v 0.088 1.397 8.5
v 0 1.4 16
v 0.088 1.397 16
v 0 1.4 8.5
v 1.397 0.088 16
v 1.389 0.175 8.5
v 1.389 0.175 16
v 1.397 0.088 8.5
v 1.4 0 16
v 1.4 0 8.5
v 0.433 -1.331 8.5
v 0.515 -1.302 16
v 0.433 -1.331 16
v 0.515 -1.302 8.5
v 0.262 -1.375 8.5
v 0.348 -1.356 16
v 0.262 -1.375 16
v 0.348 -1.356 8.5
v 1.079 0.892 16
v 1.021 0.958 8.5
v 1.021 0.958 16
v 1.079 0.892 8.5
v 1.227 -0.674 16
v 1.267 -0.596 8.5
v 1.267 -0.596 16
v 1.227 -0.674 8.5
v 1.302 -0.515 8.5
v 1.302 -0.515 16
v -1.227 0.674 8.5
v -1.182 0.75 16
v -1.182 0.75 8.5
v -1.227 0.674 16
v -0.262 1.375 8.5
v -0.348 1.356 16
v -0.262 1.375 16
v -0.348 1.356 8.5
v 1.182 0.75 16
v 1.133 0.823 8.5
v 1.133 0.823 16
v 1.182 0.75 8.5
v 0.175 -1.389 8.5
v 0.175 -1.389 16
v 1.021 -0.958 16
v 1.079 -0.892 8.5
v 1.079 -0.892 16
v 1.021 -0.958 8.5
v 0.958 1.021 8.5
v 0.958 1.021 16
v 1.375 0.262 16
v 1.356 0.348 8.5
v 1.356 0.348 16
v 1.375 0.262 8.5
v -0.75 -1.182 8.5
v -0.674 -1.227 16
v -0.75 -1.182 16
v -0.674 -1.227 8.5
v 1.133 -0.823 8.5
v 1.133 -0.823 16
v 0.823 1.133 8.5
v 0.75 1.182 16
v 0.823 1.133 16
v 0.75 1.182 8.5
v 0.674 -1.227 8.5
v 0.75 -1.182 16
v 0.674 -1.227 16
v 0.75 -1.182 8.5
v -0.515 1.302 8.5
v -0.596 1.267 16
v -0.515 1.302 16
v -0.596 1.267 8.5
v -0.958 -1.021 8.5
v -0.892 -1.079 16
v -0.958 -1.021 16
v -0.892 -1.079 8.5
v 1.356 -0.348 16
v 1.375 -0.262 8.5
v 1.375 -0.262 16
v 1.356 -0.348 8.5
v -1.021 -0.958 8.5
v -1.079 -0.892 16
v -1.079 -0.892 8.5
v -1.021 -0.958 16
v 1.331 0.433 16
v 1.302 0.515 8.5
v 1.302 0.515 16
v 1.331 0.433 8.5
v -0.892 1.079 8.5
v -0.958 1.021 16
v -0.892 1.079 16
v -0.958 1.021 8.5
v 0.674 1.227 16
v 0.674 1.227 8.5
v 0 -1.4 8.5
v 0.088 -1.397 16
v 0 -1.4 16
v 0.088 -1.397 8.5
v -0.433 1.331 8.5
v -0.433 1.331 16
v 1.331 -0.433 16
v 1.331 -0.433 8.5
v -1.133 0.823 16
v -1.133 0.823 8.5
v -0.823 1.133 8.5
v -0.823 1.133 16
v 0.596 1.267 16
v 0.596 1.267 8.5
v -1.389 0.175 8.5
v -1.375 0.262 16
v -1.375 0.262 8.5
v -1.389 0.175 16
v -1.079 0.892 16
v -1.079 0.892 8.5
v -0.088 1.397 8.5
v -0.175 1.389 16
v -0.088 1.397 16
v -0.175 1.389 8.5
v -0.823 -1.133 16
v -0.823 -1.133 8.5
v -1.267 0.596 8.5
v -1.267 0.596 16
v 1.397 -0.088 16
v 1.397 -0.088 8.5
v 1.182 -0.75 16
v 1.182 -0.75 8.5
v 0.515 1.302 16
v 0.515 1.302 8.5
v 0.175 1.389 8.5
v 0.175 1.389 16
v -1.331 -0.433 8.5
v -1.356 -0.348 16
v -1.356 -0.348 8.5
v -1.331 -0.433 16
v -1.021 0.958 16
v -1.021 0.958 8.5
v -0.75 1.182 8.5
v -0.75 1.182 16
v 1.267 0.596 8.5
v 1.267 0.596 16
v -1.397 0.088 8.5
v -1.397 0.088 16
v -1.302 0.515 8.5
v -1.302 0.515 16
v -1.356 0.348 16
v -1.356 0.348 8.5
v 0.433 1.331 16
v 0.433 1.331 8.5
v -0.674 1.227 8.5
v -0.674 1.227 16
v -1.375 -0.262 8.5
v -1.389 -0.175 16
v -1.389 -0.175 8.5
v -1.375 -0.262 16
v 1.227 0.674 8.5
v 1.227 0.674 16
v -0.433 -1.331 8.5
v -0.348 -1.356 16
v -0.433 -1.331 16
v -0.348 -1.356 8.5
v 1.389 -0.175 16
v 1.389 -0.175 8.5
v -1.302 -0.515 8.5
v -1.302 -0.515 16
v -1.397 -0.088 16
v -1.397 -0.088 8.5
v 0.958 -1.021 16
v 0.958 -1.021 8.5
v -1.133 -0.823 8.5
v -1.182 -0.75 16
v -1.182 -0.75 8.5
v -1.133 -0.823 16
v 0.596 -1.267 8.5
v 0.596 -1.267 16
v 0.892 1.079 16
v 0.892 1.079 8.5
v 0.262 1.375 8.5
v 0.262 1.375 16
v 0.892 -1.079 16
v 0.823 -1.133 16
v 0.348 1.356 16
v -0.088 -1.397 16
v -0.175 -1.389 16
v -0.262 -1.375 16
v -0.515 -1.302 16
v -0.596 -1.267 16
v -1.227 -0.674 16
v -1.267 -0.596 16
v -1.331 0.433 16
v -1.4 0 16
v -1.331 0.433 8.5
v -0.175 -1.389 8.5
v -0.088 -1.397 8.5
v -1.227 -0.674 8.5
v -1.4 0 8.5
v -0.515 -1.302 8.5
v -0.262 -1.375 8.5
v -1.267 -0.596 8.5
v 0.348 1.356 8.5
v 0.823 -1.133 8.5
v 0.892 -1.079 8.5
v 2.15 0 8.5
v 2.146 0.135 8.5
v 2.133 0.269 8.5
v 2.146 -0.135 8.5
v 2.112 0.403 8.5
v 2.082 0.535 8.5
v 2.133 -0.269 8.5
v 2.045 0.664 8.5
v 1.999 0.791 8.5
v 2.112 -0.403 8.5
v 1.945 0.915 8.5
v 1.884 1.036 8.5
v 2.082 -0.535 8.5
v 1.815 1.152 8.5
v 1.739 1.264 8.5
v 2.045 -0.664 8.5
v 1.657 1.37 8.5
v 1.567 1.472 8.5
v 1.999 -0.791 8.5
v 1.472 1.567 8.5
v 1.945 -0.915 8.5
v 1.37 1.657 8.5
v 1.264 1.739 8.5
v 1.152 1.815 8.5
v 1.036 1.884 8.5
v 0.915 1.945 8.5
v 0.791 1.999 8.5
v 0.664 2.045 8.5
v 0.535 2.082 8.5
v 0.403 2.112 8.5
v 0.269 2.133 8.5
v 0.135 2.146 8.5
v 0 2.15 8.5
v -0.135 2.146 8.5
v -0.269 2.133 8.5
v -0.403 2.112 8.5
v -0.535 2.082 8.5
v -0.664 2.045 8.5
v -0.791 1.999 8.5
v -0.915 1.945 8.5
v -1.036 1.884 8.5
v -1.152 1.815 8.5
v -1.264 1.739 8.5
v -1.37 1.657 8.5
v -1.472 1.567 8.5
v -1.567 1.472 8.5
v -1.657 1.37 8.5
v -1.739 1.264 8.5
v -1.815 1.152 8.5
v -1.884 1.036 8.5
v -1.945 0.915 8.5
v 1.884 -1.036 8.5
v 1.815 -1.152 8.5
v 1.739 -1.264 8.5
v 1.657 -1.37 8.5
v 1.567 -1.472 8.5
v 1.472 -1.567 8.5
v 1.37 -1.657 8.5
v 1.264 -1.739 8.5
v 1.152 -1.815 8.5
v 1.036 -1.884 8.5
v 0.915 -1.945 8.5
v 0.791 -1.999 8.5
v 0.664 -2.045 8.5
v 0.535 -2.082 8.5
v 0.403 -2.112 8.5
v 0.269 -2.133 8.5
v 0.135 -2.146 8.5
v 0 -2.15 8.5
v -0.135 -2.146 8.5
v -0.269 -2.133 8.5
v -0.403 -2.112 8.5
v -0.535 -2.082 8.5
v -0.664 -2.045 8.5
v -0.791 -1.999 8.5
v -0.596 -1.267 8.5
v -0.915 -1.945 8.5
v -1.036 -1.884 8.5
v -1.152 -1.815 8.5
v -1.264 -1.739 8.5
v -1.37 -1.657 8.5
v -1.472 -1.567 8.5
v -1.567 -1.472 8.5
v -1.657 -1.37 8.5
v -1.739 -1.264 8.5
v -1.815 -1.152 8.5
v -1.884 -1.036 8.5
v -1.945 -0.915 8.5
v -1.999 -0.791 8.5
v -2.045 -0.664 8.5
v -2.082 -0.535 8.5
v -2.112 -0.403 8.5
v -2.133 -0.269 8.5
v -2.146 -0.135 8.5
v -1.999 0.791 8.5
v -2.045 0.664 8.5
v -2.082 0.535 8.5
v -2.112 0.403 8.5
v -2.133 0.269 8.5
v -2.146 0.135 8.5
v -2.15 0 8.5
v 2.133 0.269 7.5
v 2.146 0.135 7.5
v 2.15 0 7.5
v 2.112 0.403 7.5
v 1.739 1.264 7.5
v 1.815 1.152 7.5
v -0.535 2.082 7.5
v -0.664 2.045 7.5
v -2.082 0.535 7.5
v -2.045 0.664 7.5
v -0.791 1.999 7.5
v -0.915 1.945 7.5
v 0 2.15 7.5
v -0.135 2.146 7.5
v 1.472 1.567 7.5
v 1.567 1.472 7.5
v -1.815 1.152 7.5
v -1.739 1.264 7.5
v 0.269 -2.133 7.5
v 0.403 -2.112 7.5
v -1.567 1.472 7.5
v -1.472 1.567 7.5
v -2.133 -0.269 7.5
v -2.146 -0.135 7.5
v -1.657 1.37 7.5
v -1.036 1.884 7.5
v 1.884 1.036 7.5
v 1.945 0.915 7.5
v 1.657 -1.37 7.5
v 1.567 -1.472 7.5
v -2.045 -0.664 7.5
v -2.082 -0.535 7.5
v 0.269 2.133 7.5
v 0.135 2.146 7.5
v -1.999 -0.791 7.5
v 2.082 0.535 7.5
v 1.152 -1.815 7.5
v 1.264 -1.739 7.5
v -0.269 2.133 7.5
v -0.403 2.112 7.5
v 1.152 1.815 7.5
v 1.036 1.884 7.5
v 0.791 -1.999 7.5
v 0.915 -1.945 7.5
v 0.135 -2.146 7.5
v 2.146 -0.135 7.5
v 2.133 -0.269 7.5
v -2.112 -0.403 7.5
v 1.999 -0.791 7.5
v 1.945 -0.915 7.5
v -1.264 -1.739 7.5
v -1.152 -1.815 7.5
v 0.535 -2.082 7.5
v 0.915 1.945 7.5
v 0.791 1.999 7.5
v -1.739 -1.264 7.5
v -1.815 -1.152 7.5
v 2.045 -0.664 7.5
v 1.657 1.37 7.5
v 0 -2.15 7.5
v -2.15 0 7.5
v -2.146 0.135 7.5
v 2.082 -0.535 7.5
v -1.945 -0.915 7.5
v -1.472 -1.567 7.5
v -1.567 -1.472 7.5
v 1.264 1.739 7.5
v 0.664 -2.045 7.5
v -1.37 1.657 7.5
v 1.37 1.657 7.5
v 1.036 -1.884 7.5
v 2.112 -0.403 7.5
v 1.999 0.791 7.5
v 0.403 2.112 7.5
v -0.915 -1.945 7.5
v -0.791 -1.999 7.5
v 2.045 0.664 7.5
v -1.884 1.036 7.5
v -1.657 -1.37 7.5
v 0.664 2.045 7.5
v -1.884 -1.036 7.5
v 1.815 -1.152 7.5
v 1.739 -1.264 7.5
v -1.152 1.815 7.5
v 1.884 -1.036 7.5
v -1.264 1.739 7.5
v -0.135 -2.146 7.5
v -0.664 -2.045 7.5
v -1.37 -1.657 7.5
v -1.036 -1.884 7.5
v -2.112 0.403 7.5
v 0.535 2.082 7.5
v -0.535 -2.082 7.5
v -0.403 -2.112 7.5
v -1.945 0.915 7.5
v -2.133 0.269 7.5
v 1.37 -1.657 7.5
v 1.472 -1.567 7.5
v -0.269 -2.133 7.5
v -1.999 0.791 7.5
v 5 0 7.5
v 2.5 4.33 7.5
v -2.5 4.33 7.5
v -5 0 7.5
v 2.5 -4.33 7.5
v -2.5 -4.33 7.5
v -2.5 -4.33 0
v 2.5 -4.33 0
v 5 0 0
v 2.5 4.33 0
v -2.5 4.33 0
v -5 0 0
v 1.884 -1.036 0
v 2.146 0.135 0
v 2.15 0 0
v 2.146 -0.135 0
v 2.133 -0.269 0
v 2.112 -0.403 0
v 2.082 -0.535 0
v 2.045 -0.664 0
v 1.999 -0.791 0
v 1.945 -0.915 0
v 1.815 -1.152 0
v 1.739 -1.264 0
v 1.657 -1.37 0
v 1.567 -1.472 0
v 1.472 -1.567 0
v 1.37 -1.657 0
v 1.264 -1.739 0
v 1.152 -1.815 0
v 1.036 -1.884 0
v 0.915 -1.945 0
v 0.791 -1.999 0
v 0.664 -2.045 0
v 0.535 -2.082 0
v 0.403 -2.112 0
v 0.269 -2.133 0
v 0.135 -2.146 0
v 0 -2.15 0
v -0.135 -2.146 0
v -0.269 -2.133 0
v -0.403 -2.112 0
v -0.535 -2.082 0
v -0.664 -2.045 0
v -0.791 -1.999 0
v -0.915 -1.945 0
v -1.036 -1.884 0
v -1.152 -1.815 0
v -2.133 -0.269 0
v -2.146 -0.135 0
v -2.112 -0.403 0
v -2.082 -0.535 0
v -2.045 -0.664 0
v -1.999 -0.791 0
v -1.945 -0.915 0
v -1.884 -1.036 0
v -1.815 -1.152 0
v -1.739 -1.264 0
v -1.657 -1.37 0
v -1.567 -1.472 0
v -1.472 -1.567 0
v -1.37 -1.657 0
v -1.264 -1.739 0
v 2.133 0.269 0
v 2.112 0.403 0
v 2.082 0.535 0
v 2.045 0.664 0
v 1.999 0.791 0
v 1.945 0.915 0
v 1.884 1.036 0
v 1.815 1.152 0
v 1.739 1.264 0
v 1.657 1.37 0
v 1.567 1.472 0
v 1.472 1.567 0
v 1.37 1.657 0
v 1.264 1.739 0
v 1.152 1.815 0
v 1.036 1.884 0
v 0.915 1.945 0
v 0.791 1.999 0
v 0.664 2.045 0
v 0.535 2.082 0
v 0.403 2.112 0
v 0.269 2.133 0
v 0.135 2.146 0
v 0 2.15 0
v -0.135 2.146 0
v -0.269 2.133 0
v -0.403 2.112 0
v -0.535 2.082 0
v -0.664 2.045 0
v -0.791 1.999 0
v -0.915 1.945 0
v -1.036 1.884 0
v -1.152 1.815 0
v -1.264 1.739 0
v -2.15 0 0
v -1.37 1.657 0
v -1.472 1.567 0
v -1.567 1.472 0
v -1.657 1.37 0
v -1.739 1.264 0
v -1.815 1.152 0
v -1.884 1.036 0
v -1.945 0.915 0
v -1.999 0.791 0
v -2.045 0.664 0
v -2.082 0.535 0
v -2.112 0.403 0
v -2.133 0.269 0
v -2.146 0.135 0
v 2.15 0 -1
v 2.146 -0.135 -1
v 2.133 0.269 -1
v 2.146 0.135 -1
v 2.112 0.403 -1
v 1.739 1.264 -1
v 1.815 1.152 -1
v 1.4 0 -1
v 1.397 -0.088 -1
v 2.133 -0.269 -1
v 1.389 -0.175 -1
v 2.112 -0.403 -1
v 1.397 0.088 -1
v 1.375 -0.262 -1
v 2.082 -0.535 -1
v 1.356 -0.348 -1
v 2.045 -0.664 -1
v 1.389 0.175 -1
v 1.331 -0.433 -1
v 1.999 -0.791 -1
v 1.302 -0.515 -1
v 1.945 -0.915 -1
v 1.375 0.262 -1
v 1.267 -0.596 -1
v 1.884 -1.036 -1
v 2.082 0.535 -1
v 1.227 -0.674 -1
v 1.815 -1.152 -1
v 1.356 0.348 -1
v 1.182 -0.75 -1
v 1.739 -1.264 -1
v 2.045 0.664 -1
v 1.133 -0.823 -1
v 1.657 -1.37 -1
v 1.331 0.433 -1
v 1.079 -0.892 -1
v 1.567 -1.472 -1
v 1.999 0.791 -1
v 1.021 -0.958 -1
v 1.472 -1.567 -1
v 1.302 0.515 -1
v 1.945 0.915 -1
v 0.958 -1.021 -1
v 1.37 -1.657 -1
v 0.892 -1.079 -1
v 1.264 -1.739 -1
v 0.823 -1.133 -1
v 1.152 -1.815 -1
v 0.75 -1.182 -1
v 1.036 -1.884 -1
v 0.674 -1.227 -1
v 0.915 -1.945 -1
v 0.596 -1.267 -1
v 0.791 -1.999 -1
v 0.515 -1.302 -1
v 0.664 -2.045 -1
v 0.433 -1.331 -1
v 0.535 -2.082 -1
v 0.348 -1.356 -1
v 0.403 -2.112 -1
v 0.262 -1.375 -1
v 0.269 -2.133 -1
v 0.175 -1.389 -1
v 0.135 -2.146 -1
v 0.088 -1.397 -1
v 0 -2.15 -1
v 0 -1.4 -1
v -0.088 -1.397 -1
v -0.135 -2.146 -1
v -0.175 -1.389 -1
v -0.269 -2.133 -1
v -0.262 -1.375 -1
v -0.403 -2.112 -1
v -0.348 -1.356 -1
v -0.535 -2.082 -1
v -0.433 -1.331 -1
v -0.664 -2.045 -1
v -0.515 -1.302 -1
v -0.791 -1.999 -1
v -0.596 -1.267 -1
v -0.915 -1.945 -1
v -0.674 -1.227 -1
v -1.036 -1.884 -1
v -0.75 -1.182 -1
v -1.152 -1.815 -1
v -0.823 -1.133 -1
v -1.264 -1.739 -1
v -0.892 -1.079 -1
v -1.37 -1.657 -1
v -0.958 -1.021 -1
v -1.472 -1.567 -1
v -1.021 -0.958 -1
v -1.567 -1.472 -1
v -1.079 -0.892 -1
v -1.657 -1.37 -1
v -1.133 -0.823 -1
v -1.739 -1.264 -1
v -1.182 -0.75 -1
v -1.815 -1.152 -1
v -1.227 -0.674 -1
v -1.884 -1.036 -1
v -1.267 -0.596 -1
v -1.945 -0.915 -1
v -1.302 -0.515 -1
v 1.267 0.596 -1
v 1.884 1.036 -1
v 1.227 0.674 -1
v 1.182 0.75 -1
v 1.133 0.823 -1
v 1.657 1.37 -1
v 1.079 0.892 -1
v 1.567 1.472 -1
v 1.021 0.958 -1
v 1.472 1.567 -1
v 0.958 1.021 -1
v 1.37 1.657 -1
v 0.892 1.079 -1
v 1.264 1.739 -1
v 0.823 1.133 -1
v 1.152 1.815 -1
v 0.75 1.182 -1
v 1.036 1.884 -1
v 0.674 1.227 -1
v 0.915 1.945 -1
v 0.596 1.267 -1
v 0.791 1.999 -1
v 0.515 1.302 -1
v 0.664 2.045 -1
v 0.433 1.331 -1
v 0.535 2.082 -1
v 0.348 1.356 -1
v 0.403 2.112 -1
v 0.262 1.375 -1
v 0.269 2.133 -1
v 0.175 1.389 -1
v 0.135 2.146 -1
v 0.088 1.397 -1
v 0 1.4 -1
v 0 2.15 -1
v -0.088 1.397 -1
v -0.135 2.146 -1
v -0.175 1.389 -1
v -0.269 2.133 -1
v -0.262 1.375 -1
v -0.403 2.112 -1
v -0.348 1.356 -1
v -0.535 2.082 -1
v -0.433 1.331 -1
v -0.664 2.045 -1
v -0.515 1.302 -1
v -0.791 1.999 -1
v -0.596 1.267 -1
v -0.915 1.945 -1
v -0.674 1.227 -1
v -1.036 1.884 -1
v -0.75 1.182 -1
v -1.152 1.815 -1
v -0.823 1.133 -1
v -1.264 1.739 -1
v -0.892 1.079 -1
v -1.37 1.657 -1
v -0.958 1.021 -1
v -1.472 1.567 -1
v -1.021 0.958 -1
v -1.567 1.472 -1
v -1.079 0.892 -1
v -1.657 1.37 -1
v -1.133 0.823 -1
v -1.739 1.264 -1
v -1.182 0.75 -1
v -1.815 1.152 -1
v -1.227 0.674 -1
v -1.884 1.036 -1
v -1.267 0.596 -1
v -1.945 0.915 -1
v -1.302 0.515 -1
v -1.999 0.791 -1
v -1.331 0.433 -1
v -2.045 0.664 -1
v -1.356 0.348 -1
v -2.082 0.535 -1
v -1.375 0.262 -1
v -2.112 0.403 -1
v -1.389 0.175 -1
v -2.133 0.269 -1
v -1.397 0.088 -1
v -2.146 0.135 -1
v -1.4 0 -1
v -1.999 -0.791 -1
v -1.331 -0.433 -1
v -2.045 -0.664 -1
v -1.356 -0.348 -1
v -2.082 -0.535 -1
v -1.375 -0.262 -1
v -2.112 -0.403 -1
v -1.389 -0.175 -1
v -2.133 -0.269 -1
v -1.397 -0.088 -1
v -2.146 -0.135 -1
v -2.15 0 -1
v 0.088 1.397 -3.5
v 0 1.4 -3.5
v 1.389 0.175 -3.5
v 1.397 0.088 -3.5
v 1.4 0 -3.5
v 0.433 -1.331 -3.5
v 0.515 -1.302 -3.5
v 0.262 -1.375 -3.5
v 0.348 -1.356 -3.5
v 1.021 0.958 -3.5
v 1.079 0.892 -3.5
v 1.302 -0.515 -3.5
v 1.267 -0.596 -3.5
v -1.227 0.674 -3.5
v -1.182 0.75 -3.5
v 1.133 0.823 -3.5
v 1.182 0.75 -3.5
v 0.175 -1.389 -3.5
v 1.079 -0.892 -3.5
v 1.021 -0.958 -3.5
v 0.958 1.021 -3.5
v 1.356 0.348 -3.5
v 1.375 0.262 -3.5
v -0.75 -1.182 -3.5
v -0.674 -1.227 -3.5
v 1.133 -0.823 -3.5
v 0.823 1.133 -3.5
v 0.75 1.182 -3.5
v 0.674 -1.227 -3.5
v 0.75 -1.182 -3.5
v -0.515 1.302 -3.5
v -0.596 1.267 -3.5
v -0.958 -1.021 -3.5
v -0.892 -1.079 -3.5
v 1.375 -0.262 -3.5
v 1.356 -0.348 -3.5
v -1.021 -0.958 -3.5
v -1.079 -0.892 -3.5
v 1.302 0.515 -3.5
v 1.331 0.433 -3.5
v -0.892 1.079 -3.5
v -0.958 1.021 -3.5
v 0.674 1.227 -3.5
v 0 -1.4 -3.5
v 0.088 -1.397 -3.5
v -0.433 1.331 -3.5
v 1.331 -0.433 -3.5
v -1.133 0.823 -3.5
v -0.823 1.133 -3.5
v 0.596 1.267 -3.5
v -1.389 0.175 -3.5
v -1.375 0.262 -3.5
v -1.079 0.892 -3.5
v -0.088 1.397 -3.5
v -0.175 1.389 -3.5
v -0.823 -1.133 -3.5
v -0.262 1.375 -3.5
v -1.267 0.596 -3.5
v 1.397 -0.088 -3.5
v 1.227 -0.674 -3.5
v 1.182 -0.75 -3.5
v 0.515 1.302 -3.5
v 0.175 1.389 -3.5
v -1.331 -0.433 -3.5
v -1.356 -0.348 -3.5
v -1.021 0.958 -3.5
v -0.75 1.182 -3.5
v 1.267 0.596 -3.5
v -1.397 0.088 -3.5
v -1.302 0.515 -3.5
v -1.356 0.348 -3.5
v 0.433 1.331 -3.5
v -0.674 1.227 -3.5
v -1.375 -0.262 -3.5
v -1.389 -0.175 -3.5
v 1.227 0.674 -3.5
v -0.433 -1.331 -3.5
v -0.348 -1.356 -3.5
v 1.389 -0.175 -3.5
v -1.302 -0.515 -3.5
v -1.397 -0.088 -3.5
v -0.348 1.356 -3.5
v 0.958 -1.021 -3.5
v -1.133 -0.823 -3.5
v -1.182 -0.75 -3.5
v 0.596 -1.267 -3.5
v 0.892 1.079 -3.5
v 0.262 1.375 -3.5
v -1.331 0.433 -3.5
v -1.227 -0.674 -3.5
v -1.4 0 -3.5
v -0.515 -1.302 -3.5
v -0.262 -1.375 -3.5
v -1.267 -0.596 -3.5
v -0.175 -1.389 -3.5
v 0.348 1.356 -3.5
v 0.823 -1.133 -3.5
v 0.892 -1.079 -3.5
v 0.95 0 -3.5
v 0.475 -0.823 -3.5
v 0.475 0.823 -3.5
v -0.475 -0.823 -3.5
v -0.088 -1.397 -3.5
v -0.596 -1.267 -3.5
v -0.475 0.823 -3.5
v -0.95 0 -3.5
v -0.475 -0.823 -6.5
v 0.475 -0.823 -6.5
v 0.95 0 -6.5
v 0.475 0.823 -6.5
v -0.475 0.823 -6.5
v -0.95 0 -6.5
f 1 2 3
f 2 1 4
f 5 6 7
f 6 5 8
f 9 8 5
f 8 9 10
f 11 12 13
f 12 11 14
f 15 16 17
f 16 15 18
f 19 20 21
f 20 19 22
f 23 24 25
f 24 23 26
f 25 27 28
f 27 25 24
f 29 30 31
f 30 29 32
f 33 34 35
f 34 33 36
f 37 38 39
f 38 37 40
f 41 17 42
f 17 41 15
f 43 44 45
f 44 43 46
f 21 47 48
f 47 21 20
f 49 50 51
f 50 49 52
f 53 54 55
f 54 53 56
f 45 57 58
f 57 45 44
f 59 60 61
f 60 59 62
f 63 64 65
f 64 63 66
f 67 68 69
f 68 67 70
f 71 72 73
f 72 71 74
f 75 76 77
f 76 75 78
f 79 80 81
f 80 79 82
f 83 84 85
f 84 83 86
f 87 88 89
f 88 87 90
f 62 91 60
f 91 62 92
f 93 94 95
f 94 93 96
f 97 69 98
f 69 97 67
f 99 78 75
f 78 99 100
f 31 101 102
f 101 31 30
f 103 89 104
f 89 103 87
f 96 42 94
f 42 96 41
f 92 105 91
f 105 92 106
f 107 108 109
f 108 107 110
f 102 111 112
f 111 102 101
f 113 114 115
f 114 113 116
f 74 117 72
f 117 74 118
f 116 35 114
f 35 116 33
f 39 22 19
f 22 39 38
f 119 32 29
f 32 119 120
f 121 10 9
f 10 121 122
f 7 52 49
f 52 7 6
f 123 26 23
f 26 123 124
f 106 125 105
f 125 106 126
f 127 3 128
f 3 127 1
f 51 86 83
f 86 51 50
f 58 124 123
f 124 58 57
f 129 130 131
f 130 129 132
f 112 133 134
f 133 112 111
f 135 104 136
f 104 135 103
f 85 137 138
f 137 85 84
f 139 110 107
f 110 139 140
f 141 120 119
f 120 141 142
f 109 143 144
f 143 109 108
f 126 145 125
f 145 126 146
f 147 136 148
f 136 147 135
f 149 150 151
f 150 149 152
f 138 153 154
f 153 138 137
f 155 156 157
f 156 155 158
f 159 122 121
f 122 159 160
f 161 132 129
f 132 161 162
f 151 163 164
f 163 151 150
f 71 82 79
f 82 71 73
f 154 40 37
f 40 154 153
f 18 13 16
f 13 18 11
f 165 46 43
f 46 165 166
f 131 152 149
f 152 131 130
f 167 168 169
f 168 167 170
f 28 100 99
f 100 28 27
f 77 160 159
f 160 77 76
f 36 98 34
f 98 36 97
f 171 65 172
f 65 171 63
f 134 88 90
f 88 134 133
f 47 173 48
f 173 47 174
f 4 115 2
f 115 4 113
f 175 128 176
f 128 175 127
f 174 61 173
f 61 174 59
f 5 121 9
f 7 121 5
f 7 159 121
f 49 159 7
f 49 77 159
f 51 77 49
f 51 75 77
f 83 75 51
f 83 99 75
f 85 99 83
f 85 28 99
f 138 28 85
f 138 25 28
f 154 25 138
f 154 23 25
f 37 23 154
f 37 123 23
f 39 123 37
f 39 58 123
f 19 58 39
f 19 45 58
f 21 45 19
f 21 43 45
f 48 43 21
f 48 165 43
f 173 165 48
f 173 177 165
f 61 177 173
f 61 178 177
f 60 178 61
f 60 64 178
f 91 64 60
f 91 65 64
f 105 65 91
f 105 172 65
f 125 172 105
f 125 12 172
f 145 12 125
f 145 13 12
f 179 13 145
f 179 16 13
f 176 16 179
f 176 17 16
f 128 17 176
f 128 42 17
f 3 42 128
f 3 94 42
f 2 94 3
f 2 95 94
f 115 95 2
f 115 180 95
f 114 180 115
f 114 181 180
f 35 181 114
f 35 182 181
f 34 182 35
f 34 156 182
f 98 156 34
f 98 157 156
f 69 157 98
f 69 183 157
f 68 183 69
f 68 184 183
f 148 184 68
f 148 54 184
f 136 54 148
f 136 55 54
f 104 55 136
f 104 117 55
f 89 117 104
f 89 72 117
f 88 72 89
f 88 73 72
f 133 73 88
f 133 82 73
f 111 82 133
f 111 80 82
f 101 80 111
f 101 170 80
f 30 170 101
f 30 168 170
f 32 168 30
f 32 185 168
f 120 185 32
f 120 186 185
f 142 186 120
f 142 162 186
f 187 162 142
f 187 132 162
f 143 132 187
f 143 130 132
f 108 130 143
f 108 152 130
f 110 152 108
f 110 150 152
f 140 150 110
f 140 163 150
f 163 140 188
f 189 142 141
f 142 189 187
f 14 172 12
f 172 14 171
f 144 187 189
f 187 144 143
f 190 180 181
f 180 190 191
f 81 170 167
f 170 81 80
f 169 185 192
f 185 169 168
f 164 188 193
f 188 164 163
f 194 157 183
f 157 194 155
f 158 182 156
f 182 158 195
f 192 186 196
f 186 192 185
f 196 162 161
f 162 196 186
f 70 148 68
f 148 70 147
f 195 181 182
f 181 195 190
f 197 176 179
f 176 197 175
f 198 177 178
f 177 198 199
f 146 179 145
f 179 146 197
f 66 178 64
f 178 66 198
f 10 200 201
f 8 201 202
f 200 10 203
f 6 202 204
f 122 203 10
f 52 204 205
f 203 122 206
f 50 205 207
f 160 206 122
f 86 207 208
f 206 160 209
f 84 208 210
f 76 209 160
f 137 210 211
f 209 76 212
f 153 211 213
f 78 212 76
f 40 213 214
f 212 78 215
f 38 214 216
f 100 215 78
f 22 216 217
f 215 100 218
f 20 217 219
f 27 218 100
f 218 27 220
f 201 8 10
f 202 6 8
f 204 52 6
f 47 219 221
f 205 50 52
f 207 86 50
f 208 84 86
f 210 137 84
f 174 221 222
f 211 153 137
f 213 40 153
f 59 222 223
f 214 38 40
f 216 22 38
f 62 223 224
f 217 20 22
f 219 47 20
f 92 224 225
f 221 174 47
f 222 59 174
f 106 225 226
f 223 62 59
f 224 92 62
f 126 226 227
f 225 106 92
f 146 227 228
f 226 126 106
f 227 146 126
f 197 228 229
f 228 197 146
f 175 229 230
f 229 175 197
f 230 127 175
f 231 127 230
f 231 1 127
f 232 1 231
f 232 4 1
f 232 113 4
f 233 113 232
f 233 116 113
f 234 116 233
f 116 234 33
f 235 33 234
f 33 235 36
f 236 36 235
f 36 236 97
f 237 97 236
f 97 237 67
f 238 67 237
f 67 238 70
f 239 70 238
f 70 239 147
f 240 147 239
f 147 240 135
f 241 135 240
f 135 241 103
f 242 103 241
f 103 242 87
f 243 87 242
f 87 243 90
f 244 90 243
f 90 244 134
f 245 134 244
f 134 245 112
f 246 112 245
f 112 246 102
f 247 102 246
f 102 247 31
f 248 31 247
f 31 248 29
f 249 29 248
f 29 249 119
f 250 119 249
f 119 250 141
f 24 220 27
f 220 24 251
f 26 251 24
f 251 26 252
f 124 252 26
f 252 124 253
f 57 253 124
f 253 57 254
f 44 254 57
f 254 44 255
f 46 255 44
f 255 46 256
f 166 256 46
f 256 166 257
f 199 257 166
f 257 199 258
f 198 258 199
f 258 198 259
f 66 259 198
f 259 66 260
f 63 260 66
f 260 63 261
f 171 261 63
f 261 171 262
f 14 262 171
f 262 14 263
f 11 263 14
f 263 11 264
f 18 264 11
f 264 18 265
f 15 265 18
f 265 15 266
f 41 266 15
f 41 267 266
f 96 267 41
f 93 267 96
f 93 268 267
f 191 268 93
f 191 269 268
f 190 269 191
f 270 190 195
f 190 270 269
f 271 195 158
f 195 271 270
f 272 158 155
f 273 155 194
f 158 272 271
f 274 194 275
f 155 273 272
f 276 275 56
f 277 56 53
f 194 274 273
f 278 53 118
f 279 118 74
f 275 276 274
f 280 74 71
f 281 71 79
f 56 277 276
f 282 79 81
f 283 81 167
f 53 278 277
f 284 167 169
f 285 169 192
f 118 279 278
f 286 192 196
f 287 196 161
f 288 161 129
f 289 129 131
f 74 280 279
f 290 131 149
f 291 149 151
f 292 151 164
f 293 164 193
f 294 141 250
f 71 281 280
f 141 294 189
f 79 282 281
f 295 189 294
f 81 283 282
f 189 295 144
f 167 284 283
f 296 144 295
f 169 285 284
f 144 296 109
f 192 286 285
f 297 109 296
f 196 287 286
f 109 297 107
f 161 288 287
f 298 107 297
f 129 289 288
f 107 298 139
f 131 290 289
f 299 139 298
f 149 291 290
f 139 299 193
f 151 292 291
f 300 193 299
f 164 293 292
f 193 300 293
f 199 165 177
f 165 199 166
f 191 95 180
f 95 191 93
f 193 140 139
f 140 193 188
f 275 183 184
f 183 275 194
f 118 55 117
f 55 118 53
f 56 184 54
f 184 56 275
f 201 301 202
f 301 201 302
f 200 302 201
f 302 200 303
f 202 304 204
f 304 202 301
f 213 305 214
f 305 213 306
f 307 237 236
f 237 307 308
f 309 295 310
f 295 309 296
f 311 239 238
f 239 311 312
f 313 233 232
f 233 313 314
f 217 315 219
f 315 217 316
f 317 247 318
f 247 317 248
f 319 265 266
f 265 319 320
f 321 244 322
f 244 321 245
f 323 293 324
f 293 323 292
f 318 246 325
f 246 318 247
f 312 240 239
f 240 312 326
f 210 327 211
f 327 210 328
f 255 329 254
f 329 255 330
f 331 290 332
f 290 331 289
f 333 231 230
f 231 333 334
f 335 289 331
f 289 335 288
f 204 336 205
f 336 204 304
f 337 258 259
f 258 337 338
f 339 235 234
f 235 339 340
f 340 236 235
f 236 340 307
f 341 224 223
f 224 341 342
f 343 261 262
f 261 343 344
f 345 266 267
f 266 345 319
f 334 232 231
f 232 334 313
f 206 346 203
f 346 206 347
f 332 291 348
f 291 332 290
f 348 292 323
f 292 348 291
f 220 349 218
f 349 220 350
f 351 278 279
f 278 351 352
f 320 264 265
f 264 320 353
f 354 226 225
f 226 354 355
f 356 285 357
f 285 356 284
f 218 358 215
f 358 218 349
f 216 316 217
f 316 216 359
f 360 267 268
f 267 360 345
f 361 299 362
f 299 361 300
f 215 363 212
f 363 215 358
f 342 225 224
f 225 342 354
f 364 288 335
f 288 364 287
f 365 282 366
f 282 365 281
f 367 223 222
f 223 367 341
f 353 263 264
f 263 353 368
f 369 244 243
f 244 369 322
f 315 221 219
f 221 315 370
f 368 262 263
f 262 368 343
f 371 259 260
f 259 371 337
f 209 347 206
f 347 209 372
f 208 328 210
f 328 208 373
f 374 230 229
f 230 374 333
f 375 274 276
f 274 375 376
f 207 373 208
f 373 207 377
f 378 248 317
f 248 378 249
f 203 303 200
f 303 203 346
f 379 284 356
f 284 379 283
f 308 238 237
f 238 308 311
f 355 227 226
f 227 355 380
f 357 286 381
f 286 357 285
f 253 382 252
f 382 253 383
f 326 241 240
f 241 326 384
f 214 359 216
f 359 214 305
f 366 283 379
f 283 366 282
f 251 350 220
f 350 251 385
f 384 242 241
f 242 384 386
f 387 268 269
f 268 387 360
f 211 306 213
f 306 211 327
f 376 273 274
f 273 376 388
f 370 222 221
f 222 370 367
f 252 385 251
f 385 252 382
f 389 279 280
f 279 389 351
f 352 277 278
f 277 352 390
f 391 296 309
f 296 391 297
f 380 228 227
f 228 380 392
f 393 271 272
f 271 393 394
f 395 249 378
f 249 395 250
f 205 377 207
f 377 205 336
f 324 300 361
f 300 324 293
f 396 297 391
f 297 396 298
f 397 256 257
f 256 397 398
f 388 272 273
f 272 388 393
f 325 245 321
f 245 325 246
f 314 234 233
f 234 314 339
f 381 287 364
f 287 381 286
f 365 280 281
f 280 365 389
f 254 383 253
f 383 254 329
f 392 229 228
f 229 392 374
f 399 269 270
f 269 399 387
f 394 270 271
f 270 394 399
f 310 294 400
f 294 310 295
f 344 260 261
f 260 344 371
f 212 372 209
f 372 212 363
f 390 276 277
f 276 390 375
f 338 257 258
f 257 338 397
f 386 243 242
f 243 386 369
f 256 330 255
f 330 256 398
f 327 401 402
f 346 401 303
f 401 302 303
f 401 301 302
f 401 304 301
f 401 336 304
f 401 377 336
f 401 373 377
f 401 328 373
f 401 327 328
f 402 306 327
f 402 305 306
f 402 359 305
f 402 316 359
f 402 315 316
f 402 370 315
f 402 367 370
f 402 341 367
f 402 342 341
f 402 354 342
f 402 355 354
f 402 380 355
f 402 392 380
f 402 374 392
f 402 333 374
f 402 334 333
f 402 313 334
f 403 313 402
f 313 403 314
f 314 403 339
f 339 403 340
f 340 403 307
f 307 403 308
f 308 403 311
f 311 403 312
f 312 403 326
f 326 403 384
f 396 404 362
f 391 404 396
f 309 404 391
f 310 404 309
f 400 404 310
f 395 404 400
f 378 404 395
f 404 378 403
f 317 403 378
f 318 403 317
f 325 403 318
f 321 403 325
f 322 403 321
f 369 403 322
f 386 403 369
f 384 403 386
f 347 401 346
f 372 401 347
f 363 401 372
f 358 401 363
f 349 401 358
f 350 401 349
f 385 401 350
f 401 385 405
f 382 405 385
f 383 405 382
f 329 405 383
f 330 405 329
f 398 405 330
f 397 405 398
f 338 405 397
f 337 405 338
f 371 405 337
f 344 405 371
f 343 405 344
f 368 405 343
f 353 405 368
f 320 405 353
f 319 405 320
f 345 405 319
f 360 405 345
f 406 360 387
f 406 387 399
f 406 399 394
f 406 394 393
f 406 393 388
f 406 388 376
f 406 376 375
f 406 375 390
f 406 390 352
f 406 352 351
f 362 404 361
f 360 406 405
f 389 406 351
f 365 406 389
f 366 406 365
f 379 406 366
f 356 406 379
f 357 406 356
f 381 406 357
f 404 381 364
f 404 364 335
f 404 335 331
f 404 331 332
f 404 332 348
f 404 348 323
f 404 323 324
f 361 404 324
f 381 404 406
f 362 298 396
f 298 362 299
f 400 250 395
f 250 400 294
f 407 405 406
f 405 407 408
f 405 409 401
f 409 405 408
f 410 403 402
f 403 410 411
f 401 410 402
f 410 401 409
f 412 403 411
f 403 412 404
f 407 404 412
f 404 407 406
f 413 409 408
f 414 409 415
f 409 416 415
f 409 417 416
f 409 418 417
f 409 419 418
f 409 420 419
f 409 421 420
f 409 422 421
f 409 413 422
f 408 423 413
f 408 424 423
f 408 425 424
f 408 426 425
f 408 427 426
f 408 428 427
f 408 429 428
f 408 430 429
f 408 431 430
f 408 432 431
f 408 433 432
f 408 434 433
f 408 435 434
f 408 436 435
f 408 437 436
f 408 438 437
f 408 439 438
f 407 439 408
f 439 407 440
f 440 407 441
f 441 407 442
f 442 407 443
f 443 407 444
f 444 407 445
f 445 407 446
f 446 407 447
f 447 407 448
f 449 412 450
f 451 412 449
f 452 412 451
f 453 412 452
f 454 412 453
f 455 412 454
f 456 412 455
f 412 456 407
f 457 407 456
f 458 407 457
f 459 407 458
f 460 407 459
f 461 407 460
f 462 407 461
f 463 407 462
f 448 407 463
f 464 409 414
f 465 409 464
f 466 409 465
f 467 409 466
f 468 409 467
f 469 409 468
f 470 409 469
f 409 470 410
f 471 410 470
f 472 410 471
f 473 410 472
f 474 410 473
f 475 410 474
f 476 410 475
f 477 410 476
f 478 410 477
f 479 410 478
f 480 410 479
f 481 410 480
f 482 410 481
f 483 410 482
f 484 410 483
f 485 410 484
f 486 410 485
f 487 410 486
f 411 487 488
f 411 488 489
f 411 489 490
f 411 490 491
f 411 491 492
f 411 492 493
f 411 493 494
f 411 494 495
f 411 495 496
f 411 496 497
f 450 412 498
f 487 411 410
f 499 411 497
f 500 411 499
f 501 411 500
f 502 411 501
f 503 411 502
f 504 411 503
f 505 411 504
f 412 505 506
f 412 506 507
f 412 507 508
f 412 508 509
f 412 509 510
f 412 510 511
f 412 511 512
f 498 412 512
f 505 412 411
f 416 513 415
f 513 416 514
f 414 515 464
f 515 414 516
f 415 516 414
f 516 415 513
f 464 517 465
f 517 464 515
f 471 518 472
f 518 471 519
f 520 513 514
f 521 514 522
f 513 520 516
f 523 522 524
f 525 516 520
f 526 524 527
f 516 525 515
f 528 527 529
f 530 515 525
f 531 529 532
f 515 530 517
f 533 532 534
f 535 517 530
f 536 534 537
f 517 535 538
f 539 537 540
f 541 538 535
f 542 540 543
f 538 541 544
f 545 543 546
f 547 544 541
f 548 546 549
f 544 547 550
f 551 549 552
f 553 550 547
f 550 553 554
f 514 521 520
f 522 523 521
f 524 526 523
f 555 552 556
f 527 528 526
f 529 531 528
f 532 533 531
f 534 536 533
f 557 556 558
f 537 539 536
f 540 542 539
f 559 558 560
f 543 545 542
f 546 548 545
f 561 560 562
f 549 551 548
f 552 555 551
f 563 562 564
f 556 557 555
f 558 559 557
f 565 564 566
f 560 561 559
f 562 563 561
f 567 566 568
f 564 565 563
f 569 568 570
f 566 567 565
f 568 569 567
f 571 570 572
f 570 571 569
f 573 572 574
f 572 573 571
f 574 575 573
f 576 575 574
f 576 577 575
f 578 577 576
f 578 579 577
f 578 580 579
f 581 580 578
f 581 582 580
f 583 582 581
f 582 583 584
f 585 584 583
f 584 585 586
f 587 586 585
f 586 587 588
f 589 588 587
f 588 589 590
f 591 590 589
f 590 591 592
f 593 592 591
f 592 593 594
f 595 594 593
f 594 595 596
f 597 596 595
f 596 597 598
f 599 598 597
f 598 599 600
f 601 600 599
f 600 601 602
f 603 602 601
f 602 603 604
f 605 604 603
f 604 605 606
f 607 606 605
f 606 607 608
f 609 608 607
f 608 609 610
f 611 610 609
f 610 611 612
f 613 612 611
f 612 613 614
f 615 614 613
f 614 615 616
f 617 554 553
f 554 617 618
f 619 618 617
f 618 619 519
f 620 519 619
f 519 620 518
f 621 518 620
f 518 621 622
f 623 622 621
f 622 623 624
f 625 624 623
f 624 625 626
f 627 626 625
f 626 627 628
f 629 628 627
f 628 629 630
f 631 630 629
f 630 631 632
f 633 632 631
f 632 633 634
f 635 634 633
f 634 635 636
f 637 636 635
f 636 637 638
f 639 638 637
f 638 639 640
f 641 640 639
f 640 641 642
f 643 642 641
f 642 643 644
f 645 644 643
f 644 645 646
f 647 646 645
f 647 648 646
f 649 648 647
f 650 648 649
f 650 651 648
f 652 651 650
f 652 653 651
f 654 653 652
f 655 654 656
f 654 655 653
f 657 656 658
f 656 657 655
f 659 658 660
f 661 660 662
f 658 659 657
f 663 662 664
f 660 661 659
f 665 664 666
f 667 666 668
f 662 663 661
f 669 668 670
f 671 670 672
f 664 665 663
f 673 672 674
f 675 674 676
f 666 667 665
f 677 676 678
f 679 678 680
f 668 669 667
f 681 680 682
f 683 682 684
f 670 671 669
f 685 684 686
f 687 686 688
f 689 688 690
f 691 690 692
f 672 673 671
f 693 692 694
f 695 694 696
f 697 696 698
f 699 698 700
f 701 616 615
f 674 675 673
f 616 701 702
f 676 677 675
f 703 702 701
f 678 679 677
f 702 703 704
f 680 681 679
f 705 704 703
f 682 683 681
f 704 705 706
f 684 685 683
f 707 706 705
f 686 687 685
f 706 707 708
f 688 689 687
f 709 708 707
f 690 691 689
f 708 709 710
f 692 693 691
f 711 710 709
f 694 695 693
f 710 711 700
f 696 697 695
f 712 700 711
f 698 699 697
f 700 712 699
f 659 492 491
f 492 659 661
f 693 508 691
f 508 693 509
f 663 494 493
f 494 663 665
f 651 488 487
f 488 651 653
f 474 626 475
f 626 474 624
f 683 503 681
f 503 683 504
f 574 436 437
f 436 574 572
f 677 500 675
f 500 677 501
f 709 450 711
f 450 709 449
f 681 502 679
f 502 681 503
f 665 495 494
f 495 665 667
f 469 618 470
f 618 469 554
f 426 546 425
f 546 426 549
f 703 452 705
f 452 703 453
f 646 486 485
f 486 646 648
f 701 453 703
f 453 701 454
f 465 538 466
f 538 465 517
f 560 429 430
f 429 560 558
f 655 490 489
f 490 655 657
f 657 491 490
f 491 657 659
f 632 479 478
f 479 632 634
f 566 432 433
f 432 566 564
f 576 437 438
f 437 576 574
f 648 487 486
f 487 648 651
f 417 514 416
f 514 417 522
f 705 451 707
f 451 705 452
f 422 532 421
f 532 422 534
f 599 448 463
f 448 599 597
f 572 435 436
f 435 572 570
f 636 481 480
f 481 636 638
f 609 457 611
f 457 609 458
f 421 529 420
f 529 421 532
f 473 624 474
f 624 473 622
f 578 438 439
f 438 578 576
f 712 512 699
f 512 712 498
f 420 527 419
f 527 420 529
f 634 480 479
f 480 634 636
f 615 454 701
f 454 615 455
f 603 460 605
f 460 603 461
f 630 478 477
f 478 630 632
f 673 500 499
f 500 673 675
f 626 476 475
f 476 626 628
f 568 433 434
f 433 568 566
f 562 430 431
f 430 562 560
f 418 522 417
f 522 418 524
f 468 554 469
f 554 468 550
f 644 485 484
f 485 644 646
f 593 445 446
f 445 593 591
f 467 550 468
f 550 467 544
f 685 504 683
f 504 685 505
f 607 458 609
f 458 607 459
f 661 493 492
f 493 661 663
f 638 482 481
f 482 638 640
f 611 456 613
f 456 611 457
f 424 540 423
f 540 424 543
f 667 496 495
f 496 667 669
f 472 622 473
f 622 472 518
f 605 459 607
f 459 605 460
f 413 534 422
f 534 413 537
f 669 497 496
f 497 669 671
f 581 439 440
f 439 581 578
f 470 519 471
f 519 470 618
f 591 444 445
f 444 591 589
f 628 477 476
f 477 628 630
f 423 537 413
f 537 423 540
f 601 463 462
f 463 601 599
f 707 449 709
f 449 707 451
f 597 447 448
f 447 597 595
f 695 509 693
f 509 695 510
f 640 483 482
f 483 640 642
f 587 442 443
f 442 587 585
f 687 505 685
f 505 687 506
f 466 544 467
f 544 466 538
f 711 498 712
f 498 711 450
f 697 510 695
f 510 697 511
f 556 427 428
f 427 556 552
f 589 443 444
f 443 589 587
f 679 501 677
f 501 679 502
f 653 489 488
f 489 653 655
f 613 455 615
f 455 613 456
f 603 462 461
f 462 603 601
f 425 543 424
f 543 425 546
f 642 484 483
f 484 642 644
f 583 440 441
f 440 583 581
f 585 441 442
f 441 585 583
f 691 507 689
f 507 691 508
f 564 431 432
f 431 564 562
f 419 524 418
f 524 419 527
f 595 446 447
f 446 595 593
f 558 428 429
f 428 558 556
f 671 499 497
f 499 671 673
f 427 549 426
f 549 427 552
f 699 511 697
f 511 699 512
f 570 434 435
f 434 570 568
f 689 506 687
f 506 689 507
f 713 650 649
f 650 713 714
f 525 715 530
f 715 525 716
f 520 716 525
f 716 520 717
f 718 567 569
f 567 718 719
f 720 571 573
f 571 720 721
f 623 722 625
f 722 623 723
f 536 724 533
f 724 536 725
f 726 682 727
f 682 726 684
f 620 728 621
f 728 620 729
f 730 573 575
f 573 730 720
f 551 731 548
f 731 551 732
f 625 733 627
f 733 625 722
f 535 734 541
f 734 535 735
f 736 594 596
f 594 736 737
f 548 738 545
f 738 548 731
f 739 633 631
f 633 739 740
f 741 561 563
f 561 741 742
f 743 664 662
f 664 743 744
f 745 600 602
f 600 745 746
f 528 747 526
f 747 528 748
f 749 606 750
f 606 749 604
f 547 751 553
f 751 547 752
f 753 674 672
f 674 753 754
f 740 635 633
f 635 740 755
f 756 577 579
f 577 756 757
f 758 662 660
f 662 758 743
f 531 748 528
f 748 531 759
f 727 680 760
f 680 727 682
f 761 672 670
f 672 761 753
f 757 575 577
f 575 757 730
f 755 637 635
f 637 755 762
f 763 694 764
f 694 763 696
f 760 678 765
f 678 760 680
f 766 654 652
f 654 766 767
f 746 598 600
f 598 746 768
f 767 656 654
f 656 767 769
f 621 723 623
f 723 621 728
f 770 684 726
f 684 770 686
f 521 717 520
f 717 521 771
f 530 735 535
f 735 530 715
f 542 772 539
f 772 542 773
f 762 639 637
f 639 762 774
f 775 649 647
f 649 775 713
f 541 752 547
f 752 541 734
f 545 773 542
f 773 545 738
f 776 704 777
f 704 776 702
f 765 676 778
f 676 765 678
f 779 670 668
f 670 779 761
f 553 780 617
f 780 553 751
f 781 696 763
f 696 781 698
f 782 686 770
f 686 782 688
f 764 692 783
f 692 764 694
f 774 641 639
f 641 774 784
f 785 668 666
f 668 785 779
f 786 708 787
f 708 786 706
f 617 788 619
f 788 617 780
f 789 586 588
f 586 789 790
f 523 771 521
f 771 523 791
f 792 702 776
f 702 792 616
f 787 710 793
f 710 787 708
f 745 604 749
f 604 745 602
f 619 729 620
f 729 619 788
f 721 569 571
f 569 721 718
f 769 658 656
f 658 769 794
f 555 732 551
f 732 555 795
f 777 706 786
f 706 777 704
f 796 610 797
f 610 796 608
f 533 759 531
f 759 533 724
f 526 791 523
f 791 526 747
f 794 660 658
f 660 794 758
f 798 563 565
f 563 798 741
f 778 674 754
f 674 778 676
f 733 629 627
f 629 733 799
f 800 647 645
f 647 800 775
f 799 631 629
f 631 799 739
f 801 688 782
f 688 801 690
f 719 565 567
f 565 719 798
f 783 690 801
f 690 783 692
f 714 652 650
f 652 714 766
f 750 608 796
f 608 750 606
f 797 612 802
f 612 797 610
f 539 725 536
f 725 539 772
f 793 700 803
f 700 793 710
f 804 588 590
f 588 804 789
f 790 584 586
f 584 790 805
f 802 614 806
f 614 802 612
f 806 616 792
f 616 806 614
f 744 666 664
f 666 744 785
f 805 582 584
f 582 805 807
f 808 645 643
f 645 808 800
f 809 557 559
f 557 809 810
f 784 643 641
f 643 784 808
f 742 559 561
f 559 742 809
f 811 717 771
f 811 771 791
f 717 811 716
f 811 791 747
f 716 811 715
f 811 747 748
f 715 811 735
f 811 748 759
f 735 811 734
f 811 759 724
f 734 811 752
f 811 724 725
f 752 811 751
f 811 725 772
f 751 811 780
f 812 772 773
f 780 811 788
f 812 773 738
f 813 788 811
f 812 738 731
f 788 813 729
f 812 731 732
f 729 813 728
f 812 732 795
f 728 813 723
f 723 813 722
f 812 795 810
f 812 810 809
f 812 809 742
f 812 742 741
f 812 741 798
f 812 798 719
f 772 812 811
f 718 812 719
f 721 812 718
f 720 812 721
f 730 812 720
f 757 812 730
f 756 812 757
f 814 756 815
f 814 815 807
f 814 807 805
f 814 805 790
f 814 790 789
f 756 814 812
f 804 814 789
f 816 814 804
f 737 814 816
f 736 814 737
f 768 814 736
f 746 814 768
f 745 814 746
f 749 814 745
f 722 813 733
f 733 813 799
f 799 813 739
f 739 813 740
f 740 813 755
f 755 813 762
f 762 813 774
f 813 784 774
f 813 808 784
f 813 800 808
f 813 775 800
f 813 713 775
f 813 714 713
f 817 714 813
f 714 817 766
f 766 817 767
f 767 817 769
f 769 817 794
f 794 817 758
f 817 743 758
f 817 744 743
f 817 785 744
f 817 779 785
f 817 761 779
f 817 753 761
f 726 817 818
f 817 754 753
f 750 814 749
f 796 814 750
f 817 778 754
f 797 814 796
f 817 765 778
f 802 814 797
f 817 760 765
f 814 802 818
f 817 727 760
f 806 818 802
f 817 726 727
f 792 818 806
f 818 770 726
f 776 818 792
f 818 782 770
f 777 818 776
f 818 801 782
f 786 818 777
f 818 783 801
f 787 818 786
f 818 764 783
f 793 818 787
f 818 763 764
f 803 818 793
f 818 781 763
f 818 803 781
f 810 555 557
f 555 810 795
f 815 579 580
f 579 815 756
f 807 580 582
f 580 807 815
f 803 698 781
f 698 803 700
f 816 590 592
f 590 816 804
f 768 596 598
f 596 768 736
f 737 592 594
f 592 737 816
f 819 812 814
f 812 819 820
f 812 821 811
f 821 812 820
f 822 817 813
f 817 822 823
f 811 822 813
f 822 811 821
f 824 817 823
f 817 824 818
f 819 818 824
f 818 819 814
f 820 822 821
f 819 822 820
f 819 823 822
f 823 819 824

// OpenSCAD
$fn = 100;

translate([0, 0, 8.5]) cylinder(d = 2.8, h = 7.5);
translate([0, 0, 7.5]) cylinder(d = 4.3, h = 1);
cylinder(d = 10, h = 7.5, $fn = 6);
translate([0, 0, -1]) cylinder(d = 4.3, h = 1);
translate([0, 0, -3.5]) cylinder(d = 2.8, h = 3.5);
translate([0, 0, -6.5]) cylinder(d = 1.9, h = 3, $fn = 6);
